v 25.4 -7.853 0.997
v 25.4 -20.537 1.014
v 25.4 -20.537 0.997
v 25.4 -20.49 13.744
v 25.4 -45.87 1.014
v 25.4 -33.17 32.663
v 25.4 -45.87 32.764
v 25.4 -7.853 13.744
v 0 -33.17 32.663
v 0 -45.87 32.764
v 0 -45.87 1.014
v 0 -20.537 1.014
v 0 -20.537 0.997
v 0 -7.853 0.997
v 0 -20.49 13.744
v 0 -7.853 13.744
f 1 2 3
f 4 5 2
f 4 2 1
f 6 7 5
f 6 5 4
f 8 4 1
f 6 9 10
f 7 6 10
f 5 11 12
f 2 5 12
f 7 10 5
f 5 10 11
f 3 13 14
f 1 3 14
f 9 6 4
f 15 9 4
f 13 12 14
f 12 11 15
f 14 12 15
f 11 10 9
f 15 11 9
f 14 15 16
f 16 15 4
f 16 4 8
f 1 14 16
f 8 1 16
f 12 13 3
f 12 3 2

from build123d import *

# Parameters (mm, degrees)
F1_DEPTH = 25.4
F3_DEPTH = 25.4
F4_W     = 12.683143
F4_H     = 12.7472
F5_DEPTH = 25.4


with BuildPart() as f1:
    # F0 (on Right) → F1 (new body)
    with BuildSketch(Plane.YZ):
        Polygon((-20.469976, 32.562451), (-45.869976, 32.76404), (-45.869976, 1.01404), (-20.469976, 1.01404), align=None)
    extrude(amount=F1_DEPTH)

    # F2 (on face) → F3 (cut)
    with BuildSketch(Plane.YZ.offset(25.4)):
        Polygon((-20.469976, 32.562451), (-33.169976, 32.663246), (-20.469976, 13.71404), align=None)
    extrude(amount=-F3_DEPTH, mode=Mode.SUBTRACT)

    # F4 (on Right) → F5 (join)
    with BuildSketch(Plane.YZ):
        with Locations((-14.194957, 7.370238)):
            Rectangle(F4_W, F4_H)
    extrude(amount=F5_DEPTH)


solid = f1.part
